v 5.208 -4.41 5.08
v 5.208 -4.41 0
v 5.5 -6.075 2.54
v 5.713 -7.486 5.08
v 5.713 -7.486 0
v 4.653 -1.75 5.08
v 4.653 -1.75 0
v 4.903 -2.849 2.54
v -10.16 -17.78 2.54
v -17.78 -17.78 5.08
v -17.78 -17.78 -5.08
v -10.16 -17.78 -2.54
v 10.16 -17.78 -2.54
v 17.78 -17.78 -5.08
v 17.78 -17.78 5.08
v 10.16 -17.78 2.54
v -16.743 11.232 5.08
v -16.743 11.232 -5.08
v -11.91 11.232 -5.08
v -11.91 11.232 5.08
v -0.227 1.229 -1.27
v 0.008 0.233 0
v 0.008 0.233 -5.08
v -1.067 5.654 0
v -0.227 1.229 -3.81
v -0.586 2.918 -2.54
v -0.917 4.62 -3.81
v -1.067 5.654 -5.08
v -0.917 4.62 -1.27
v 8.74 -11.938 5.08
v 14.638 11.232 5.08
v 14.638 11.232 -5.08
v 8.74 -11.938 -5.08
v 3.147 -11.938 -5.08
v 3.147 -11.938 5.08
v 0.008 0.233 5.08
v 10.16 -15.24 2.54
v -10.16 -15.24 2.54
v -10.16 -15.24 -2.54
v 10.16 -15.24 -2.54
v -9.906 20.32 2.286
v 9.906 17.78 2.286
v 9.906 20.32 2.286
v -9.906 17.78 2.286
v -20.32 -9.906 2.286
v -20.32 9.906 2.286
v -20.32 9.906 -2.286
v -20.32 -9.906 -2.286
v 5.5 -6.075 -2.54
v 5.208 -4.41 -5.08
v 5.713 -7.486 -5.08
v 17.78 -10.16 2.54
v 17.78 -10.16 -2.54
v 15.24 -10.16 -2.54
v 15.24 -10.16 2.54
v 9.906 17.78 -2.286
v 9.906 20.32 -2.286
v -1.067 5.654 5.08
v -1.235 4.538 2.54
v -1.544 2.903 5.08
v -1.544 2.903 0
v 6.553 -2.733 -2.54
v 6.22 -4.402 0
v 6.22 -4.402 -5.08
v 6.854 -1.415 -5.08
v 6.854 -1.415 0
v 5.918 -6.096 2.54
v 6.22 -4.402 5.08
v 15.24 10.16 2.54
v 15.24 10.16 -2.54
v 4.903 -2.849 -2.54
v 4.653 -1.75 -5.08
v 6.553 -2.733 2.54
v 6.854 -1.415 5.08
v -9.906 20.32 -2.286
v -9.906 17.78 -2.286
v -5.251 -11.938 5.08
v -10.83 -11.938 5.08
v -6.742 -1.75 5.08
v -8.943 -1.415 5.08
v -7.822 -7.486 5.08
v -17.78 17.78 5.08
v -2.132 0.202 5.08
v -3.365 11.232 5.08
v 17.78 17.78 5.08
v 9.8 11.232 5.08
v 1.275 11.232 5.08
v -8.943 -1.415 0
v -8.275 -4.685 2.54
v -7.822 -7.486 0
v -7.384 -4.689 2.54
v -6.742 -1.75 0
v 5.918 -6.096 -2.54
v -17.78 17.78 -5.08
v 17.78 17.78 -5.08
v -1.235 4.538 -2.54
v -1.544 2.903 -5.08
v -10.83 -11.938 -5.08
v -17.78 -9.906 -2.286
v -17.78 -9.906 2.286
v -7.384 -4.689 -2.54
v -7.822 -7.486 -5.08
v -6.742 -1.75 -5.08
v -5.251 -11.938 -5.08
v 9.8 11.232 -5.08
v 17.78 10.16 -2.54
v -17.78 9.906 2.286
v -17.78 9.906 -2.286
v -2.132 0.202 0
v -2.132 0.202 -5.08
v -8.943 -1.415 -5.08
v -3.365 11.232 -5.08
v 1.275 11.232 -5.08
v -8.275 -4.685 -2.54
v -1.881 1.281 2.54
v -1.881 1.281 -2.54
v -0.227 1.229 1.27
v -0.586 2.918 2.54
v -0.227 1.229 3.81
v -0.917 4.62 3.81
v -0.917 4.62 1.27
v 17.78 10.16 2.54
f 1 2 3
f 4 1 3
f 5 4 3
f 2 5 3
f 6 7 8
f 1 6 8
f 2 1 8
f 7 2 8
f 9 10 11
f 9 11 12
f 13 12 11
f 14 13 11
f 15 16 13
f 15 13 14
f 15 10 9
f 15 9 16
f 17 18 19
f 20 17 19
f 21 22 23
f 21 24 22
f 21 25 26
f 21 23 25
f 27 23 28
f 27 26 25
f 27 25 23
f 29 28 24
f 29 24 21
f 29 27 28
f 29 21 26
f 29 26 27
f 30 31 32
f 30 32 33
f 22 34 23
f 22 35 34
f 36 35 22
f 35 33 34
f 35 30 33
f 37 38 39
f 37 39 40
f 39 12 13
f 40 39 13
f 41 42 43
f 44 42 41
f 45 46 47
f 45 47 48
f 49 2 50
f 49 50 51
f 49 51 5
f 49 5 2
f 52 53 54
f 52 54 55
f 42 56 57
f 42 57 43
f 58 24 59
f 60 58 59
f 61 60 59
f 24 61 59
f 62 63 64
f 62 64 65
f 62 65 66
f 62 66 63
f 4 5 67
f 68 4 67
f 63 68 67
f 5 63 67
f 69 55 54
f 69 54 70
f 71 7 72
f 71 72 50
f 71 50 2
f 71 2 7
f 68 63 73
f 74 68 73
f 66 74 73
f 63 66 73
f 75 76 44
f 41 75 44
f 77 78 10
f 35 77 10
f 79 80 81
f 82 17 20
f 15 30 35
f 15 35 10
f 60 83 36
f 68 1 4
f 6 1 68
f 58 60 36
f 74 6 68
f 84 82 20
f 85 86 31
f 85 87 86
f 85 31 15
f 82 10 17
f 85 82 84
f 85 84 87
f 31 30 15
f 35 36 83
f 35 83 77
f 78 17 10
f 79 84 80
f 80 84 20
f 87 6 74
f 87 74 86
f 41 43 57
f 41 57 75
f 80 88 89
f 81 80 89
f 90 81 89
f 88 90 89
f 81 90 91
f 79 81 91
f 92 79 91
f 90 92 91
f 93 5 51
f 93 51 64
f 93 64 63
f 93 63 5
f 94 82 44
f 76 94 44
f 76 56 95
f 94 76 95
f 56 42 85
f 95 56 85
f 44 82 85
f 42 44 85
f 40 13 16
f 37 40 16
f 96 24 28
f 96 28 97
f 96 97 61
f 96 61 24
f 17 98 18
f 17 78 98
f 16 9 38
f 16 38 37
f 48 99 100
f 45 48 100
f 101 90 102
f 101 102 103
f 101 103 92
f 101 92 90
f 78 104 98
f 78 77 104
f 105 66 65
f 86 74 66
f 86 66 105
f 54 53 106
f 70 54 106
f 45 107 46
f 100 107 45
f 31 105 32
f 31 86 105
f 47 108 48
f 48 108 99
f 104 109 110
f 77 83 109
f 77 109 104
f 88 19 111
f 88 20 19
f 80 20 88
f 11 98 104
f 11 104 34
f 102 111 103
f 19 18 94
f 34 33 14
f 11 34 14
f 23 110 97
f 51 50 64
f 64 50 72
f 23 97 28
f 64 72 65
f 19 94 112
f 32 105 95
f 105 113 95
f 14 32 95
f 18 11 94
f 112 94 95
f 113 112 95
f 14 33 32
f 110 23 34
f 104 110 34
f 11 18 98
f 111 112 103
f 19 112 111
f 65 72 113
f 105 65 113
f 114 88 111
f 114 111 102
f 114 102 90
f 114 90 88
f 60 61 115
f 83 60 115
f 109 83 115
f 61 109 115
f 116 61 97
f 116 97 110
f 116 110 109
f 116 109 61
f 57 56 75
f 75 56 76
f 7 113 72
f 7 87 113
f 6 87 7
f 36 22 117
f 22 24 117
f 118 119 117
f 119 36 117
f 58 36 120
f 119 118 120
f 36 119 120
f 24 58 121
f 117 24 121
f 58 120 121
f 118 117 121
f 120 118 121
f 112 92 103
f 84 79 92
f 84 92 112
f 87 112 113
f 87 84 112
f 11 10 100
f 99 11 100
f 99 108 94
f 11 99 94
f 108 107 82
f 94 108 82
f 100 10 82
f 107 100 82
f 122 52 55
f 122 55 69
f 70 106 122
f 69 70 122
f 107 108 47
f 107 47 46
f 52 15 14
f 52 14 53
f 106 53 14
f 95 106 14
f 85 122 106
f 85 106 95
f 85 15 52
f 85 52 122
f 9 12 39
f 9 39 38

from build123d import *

# Parameters (mm, degrees)
F0_W     = 35.56
F0_H     = 35.56
F1_DEPTH = 5.08
F2_W     = 19.812
F2_H     = 4.572
F3_DEPTH = 2.54
F4_W     = 19.812
F4_H     = 4.572
F5_DEPTH = 2.54
F6_W     = 20.32
F6_H     = 5.08
F7_DEPTH = 2.54
F8_W     = 20.32
F8_H     = 5.08
F9_DEPTH = 2.54


with BuildPart() as f1:
    # F0 (on Top) → F1 (new body, symmetric)
    with BuildSketch(Plane.XY):
        Rectangle(F0_W, F0_H)
        with BuildLine():
            Line((14.6379626736, 11.2322239583), (8.7401796875, -11.938))
            Line((8.7401796875, -11.938), (3.1466675347, -11.938))
            Line((3.1466675347, -11.938), (0.0076067708, 0.2328333333))
            add(Edge.make_bspline(
                [(0.0076067708, 0.2328333333), (-0.1648133681, 0.8819444444), (-0.5857213542, 2.9180234375)],
                knots=[0, 0, 0, 1, 1, 1], degree=2))
            add(Edge.make_bspline(
                [(-0.5857213542, 2.9180234375), (-1.0066293403, 4.9541024306), (-1.0674835069, 5.6539253472)],
                knots=[0, 0, 0, 1, 1, 1], degree=2))
            add(Edge.make_bspline(
                [(-1.0674835069, 5.6539253472), (-1.1638359375, 4.7968958333), (-1.5441744792, 2.9028098958)],
                knots=[0, 0, 0, 1, 1, 1], degree=2))
            add(Edge.make_bspline(
                [(-1.5441744792, 2.9028098958), (-1.9245130208, 1.0087239583), (-2.1324314236, 0.20240625)],
                knots=[0, 0, 0, 1, 1, 1], degree=2))
            Line((-2.1324314236, 0.20240625), (-5.2512074653, -11.938))
            Line((-5.2512074653, -11.938), (-10.8295060764, -11.938))
            Line((-10.8295060764, -11.938), (-16.7425026042, 11.2322239583))
            Line((-16.7425026042, 11.2322239583), (-11.9096675347, 11.2322239583))
            Line((-11.9096675347, 11.2322239583), (-8.9430269097, -1.4153003472))
            add(Edge.make_bspline(
                [(-8.9430269097, -1.4153003472), (-8.1671362847, -4.9194861111), (-7.8222960069, -7.4855034722)],
                knots=[0, 0, 0, 1, 1, 1], degree=2))
            add(Edge.make_bspline(
                [(-7.8222960069, -7.4855034722), (-7.7259435764, -6.5828333333), (-7.3836388889, -4.6887473958)],
                knots=[0, 0, 0, 1, 1, 1], degree=2))
            add(Edge.make_bspline(
                [(-7.3836388889, -4.6887473958), (-7.0413342014, -2.7946614583), (-6.7421345486, -1.7499982639)],
                knots=[0, 0, 0, 1, 1, 1], degree=2))
            Line((-6.7421345486, -1.7499982639), (-3.3647282986, 11.2322239583))
            Line((-3.3647282986, 11.2322239583), (1.2754019097, 11.2322239583))
            Line((1.2754019097, 11.2322239583), (4.6528081597, -1.7499982639))
            add(Edge.make_bspline(
                [(4.6528081597, -1.7499982639), (4.8759401042, -2.6171701389), (5.2081024306, -4.4098324653)],
                knots=[0, 0, 0, 1, 1, 1], degree=2))
            add(Edge.make_bspline(
                [(5.2081024306, -4.4098324653), (5.5402647569, -6.2024947917), (5.7126848958, -7.4855034722)],
                knots=[0, 0, 0, 1, 1, 1], degree=2))
            add(Edge.make_bspline(
                [(5.7126848958, -7.4855034722), (5.8698914931, -6.2481354167), (6.2198029514, -4.4022256944)],
                knots=[0, 0, 0, 1, 1, 1], degree=2))
            add(Edge.make_bspline(
                [(6.2198029514, -4.4022256944), (6.5697144097, -2.5563159722), (6.8537005208, -1.4153003472)],
                knots=[0, 0, 0, 1, 1, 1], degree=2))
            Line((6.8537005208, -1.4153003472), (9.8000564236, 11.2322239583))
            Line((9.8000564236, 11.2322239583), (14.6379626736, 11.2322239583))
        make_face(mode=Mode.SUBTRACT)
    extrude(amount=F1_DEPTH, both=True)

    # F2 (on face) → F3 (join)
    with BuildSketch(Plane(origin=(0, 17.78, 0), x_dir=(-1, 0, 0), z_dir=(0, 1, 0))):
        Rectangle(F2_W, F2_H)
    extrude(amount=F3_DEPTH)

    # F4 (on face) → F5 (join)
    with BuildSketch(Plane(origin=(-17.78, 0, 0), x_dir=(0, -1, 0), z_dir=(-1, 0, 0))):
        Rectangle(F4_W, F4_H)
    extrude(amount=F5_DEPTH)

    # F6 (on face) → F7 (cut)
    with BuildSketch(Plane.XZ.offset(17.78)):
        Rectangle(F6_W, F6_H)
    extrude(amount=-F7_DEPTH, mode=Mode.SUBTRACT)

    # F8 (on face) → F9 (cut)
    with BuildSketch(Plane.YZ.offset(17.78)):
        Rectangle(F8_W, F8_H)
    extrude(amount=-F9_DEPTH, mode=Mode.SUBTRACT)


solid = f1.part
